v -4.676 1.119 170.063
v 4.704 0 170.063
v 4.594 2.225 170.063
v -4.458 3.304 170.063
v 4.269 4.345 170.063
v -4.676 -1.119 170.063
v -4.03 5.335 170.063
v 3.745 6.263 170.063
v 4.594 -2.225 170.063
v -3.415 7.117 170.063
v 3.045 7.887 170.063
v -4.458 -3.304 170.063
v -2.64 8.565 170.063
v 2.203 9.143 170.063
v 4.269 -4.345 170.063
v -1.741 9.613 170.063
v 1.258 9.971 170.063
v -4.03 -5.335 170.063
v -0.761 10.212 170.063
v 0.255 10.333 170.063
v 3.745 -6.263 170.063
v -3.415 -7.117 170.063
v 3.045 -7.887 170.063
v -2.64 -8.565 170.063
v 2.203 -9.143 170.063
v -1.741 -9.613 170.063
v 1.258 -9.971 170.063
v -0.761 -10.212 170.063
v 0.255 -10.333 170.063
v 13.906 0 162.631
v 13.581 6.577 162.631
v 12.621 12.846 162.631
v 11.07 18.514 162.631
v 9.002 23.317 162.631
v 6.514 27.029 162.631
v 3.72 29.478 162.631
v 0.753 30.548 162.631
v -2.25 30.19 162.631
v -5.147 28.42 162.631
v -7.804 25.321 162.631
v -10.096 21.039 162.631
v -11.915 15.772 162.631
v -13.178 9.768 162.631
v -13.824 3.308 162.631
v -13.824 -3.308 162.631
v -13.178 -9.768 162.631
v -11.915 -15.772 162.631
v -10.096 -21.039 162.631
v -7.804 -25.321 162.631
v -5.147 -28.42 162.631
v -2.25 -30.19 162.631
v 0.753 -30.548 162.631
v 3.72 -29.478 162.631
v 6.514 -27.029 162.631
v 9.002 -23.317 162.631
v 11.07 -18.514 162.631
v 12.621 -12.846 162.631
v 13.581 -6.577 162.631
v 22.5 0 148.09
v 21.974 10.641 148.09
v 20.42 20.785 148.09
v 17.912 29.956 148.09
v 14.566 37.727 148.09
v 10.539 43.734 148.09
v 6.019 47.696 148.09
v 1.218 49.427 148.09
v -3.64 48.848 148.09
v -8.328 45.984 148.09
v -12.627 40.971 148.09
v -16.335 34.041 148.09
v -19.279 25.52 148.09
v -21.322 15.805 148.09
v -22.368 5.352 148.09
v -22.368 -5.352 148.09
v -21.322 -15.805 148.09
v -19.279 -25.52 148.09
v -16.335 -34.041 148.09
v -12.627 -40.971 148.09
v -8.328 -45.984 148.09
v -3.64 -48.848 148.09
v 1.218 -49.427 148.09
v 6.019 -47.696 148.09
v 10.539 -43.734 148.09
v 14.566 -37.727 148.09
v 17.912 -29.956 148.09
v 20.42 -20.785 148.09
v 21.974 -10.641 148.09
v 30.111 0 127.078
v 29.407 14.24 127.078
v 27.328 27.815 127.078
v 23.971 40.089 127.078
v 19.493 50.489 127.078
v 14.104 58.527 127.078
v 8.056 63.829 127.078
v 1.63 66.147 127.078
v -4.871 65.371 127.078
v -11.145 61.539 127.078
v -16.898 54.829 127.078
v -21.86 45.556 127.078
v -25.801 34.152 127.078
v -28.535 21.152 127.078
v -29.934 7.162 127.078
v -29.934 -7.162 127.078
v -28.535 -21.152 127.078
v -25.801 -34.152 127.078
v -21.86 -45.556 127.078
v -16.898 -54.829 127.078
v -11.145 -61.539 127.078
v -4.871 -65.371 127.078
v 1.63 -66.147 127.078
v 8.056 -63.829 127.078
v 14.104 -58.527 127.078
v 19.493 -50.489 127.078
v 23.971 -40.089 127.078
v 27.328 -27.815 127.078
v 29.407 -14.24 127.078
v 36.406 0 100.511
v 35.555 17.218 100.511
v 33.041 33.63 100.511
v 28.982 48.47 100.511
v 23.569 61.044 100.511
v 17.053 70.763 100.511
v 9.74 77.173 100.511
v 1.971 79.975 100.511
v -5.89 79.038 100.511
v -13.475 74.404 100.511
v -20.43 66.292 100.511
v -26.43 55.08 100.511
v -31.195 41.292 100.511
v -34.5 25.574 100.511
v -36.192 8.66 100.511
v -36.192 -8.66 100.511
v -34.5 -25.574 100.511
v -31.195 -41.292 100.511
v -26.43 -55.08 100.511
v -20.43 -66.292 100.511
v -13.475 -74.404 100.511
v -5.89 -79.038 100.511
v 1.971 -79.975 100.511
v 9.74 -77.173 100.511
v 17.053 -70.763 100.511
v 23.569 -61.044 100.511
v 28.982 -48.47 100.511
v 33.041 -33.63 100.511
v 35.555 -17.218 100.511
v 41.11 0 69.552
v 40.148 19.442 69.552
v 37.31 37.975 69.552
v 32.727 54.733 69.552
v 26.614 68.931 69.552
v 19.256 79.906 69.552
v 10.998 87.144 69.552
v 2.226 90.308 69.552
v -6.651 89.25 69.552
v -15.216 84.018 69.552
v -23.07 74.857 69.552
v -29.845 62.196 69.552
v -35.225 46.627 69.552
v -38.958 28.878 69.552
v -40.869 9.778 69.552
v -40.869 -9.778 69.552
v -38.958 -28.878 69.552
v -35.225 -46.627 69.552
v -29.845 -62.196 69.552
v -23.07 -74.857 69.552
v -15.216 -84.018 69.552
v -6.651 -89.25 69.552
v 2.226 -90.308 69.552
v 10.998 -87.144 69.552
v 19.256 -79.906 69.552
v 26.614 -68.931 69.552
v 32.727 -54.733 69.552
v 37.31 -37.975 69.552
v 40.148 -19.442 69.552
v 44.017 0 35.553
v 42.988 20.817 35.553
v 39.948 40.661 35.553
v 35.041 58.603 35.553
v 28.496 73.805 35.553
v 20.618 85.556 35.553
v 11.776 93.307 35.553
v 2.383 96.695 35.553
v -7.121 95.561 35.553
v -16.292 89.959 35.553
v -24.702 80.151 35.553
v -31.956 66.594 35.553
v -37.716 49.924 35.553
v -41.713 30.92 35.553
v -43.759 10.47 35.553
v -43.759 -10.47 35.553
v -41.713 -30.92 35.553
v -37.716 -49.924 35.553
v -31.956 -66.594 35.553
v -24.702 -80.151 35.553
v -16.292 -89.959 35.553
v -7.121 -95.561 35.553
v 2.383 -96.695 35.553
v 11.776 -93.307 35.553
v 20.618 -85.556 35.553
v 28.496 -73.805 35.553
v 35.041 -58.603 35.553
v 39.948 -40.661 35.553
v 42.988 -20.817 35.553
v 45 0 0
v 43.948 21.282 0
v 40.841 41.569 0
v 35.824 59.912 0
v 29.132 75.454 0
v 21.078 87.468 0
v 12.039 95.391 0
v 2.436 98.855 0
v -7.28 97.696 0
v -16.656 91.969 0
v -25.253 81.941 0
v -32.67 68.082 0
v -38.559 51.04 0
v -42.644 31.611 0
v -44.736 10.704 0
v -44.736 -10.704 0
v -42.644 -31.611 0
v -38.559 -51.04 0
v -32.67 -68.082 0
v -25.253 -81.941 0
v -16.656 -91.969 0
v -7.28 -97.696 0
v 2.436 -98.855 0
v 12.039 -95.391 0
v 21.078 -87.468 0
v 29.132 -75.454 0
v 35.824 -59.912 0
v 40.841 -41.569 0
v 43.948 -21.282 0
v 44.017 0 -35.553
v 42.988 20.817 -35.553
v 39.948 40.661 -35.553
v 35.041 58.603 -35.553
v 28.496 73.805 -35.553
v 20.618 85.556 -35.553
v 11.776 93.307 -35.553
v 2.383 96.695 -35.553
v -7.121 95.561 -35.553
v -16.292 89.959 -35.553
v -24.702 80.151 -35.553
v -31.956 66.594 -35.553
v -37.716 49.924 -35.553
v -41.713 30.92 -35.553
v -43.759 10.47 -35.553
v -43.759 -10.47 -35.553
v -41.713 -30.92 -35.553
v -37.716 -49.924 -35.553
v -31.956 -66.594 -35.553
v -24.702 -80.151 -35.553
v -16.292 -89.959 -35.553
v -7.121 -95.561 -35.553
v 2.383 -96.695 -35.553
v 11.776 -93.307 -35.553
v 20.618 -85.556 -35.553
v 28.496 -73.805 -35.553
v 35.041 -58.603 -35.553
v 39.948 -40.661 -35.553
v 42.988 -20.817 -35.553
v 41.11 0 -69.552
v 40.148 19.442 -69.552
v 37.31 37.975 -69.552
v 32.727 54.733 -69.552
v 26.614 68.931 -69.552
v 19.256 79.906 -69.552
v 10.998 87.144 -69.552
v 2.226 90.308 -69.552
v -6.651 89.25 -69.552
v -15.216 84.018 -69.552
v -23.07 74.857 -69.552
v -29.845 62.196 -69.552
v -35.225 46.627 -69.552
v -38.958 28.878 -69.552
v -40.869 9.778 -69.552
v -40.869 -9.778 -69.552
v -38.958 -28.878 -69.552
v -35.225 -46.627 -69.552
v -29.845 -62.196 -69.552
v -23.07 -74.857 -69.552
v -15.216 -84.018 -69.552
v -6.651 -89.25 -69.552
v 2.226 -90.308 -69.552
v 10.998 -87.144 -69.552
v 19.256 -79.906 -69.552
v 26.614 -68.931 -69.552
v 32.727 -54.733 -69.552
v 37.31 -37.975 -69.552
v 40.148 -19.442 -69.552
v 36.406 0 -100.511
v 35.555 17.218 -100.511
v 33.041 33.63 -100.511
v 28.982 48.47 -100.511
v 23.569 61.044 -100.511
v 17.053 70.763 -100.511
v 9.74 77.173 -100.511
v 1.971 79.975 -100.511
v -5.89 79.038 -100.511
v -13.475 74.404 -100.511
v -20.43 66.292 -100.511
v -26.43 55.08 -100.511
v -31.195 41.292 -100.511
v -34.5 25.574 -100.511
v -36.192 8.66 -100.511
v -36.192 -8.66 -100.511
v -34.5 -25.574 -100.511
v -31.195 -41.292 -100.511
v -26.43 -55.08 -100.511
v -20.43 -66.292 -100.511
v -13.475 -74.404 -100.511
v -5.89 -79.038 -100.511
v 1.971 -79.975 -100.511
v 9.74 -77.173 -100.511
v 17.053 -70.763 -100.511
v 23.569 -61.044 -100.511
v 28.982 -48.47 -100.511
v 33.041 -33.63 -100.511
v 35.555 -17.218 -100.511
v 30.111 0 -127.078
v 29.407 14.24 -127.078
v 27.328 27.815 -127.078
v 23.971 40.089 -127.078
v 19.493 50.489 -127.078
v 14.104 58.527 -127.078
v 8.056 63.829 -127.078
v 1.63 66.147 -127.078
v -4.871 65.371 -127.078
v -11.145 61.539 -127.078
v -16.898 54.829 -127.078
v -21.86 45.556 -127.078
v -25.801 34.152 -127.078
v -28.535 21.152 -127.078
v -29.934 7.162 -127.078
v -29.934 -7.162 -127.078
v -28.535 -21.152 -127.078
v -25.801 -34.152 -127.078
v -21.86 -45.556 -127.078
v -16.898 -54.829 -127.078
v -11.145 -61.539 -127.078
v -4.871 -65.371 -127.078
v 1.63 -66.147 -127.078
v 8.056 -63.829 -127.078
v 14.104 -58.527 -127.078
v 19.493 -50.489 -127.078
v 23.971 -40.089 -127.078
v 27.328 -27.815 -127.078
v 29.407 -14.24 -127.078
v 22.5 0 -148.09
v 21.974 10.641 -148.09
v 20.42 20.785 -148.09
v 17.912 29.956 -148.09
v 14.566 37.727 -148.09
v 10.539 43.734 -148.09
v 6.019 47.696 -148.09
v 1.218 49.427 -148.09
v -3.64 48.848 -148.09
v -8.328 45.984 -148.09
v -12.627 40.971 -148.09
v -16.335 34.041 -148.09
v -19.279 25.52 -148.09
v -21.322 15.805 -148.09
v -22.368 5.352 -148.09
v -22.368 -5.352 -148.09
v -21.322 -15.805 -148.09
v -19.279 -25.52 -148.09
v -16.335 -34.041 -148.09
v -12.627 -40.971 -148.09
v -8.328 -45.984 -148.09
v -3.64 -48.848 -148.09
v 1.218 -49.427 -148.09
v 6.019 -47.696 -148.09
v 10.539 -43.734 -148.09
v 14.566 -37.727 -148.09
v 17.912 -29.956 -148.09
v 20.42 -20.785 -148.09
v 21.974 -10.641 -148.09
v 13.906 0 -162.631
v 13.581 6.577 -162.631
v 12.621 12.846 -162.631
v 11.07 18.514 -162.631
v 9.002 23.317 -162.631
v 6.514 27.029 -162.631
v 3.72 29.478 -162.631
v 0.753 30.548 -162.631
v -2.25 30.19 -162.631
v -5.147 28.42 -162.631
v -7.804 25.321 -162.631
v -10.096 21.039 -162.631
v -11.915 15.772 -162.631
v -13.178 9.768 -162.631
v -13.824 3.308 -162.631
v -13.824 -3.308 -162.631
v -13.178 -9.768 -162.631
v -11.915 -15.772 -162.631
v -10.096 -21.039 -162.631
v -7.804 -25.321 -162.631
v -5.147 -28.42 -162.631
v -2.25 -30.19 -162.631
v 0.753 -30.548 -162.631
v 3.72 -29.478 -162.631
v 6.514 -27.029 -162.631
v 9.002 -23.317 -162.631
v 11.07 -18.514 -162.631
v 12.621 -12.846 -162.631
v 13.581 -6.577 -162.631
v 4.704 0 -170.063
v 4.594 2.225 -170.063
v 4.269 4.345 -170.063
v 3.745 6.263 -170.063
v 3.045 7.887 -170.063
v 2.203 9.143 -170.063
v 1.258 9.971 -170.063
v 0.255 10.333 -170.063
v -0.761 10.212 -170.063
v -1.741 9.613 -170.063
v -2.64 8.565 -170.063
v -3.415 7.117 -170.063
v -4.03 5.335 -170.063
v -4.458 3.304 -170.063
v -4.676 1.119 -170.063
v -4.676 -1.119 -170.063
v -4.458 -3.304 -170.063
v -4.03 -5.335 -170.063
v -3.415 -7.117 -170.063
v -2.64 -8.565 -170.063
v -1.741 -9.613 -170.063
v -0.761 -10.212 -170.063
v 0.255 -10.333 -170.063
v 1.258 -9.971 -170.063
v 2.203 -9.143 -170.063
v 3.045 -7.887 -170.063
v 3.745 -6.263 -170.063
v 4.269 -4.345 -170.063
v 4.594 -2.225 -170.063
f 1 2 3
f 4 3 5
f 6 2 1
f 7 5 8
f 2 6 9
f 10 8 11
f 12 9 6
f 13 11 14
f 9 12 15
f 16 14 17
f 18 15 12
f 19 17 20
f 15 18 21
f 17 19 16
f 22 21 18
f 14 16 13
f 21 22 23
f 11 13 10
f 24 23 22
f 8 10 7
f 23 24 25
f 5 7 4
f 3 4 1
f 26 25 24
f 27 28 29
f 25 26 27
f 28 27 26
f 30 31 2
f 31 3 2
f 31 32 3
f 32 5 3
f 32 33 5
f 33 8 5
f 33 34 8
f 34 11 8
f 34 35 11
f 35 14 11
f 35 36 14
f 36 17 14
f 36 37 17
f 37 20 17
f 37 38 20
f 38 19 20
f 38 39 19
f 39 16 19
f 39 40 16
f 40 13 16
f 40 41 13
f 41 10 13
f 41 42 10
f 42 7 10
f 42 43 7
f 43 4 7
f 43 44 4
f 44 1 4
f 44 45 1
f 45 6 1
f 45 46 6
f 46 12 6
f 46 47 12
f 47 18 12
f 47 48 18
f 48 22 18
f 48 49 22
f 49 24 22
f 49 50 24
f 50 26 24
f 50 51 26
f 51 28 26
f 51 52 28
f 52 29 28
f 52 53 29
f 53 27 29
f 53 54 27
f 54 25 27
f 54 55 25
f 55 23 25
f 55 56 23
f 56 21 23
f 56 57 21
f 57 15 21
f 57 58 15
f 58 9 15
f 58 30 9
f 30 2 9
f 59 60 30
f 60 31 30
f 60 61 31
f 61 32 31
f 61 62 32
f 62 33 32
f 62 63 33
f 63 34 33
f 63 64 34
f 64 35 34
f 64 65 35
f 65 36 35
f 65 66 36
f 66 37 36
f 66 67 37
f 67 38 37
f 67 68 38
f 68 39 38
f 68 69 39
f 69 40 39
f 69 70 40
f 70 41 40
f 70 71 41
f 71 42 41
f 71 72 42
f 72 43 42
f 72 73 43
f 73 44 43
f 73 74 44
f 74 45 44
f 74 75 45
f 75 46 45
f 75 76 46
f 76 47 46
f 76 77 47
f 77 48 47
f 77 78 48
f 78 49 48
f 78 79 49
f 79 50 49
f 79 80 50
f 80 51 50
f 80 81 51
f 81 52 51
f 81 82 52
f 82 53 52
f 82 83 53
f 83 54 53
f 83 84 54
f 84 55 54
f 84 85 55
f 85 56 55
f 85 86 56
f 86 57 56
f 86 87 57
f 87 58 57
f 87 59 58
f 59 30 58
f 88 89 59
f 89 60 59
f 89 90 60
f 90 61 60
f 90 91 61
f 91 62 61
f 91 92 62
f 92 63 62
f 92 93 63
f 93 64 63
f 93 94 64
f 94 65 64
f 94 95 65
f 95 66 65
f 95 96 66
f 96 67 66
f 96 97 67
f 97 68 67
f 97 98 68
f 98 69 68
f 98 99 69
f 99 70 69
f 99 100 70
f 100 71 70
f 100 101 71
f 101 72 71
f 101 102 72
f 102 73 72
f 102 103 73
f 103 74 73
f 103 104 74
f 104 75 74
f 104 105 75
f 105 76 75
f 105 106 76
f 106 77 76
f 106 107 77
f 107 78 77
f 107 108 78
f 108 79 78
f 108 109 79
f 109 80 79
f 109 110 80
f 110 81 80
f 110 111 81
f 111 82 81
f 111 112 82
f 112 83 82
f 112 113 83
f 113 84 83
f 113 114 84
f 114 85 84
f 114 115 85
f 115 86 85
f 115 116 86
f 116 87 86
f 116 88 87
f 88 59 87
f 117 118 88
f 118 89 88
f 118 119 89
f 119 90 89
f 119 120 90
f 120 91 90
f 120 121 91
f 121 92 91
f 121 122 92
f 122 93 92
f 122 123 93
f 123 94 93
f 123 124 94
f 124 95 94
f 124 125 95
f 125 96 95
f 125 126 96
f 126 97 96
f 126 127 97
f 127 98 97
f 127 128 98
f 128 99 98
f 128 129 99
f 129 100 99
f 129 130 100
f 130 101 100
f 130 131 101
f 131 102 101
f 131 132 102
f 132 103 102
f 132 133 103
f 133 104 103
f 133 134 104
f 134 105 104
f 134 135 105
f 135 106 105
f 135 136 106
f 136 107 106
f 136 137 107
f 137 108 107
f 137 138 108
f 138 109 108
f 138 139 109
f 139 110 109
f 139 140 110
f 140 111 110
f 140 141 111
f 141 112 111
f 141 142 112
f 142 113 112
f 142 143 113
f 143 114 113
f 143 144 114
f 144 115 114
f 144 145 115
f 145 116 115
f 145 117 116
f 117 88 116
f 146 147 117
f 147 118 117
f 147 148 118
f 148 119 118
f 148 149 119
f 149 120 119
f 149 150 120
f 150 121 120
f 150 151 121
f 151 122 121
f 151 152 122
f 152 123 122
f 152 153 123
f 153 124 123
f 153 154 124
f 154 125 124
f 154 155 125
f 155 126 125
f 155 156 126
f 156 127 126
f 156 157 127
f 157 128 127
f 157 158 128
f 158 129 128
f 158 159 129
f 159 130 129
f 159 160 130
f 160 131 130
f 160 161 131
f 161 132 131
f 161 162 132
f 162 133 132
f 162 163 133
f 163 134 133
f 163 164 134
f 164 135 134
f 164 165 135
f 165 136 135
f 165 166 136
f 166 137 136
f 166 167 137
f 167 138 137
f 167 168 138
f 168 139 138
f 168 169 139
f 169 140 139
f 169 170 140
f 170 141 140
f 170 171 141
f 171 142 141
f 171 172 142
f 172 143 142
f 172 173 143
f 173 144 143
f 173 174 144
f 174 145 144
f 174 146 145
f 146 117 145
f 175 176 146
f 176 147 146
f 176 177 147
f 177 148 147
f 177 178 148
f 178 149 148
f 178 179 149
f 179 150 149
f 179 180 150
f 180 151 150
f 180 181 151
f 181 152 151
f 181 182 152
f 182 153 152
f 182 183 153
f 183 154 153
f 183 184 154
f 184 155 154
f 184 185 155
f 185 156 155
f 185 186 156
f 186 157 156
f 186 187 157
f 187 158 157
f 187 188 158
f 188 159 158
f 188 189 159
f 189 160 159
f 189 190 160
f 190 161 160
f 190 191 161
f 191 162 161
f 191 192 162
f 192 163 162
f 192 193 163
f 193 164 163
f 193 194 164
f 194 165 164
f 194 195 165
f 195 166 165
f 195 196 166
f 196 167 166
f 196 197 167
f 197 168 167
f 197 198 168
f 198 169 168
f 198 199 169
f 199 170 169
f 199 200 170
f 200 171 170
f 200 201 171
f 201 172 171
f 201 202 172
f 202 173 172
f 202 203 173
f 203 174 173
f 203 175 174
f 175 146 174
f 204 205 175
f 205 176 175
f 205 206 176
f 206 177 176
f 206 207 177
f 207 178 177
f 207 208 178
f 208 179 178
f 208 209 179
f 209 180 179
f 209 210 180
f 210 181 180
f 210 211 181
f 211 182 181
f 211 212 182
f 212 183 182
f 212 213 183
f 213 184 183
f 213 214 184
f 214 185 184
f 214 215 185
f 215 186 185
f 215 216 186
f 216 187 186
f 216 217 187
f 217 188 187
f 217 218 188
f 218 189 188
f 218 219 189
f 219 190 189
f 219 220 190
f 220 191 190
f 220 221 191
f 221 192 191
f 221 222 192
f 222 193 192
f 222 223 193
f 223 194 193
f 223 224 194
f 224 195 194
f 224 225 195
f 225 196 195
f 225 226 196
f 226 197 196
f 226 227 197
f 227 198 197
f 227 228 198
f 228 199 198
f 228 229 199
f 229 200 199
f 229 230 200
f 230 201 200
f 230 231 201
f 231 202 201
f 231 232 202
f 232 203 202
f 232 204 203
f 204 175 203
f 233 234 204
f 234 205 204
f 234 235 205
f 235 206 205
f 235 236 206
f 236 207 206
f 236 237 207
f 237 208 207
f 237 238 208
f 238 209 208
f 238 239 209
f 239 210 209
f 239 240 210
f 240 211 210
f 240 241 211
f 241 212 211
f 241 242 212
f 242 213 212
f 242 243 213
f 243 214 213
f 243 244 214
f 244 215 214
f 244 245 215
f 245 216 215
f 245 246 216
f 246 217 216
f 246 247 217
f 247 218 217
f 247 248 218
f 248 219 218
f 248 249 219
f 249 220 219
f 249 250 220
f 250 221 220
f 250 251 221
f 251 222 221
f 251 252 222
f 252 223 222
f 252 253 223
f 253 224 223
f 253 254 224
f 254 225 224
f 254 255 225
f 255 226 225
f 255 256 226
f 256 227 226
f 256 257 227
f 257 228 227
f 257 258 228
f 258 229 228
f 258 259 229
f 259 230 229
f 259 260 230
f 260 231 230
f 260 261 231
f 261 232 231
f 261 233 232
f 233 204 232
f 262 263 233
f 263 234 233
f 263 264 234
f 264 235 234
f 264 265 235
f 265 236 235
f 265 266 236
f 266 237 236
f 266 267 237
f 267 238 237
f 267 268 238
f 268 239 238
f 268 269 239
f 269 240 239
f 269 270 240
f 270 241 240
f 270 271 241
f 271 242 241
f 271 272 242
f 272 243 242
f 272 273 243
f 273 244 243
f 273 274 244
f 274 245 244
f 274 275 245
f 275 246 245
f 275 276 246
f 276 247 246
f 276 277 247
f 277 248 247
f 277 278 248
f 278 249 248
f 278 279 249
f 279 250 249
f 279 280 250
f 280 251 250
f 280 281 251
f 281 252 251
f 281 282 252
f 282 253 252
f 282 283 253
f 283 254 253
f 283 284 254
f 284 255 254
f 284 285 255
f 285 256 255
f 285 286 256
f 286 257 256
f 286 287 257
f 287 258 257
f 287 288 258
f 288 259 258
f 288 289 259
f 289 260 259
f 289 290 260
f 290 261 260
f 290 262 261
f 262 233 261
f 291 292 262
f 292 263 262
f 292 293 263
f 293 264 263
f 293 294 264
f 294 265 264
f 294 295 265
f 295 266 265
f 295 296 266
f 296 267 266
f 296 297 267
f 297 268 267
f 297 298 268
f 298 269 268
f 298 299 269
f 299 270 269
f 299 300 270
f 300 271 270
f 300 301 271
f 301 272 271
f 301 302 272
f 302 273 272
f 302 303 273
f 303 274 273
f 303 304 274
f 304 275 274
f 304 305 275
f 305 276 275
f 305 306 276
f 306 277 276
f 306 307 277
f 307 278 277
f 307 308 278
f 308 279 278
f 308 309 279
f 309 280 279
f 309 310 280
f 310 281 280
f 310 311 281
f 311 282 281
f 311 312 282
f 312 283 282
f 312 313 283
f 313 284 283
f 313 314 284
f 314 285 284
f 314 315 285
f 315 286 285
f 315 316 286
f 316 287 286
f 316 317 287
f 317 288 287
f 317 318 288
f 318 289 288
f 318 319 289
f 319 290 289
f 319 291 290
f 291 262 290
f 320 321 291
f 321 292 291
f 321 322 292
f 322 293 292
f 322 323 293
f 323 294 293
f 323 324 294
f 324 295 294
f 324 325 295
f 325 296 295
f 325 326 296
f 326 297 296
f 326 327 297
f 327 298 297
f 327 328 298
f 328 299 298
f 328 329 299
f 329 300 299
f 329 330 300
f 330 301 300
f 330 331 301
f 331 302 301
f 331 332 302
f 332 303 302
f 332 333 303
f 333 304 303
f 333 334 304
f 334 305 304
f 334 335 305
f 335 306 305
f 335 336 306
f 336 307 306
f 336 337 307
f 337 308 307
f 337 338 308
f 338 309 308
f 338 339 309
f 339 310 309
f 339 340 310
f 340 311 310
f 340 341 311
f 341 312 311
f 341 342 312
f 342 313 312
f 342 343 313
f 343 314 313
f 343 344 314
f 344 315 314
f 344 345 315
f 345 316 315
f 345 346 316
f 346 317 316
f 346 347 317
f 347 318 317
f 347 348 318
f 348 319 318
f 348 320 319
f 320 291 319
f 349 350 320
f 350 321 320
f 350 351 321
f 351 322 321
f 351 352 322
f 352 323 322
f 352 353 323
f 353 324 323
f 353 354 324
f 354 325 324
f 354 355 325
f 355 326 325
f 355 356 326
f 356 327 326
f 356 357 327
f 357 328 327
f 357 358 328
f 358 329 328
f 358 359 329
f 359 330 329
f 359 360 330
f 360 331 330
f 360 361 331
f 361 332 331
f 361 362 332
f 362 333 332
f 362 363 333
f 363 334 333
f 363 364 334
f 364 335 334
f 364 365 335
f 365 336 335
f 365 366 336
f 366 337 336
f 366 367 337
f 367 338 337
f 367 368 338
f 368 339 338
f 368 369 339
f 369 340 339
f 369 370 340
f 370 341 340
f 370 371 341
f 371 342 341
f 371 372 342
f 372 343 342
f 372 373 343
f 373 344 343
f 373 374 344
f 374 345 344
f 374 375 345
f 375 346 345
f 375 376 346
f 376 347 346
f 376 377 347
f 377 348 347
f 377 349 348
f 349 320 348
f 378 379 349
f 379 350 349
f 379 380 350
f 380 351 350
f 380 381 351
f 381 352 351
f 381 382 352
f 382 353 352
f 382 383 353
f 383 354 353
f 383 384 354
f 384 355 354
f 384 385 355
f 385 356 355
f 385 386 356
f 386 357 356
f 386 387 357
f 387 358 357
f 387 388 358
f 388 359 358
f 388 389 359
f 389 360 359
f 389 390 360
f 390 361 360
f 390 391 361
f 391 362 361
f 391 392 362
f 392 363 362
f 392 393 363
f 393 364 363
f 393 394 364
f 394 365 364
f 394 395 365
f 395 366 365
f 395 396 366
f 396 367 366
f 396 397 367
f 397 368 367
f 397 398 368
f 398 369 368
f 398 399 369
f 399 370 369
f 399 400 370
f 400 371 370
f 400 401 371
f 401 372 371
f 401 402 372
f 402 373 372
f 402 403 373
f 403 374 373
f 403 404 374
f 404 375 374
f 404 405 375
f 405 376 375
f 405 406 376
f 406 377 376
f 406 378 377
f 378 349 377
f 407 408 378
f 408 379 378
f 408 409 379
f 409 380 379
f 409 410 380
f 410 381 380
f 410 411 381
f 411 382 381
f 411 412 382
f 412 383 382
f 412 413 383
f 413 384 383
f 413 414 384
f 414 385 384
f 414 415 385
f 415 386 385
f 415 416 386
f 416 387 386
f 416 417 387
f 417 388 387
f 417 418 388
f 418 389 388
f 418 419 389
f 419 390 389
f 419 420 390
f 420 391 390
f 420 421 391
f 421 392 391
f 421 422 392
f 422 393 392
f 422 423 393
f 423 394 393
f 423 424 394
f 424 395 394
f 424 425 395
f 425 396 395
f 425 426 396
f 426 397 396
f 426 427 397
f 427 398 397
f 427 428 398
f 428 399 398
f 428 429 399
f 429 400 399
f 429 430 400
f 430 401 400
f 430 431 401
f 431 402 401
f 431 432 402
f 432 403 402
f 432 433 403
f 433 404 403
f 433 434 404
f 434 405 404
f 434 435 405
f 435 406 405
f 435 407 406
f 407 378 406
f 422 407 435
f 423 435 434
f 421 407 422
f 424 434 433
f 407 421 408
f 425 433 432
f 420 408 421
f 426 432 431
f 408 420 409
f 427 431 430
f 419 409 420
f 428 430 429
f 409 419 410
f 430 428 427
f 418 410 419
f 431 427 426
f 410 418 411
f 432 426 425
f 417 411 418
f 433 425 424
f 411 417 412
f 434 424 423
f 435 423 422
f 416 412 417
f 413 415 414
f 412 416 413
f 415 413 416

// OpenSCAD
// Generated by SolidPython 1.0.1 on 2020-07-29 00:46:46


scale(v = [5, 11, 19]) {
	sphere(r = 9);
}
/***********************************************
*********      SolidPython code:      **********
************************************************
 
# import packages: SolidPython
from solid import *
from solid.utils import *
from itertools import chain, combinations, permutations


class Resize:

    def __init__(self, scad_file):
        self.scad_file = scad_file
        #self.scad_file = import_scad(scad_file)
        # cone/cylinder param:
        self.r1 = 0
        self.r2 = 0
        self.h = 0
        # rectangular prism param:
        self.w = 0
        self.l = 0
        # ellipse param:
        self.r = 0

    # import OpenScad code (file name corresponds to shape)


    # classify shape + parameters
    def assign(self, param1, param2, param3):
        if self.scad_file == 'cone.scad':
            self.r1 = param1
            self.r2 = param2
            self.h = param3
        elif self.scad_file == 'cylinder.scad':
            self.r1 = param1
            self.r2 = param2
            self.h = param3
        elif self.scad_file == 'rectangularPrism.scad':
            self.h = param1
            self.l = param2
            self.w = param3
        else:
            self.r = param1
            self.h = param2

    # resize parameters
    def iterate(self):
        x = range(3, 20, 2)
        i = 1
        if self.scad_file == 'cone.scad':
            tempList = list(permutations(x, 2))
            for temp in tempList:
                param1 = temp[0]
                param2 = temp[1]
                filepath = 'produced_scad_files/' + 'cone' + str(param1) + '_' + str(param2) + '_' + '.scad'
                scad_render_to_file(cylinder(h=param1, r1=param2, r2=0), filepath)

        elif self.scad_file == 'cylinder.scad':
            tempList = list(permutations(x, 3))
            for temp in tempList:
                param1 = temp[0]
                param2 = temp[1]
                filepath = 'produced_scad_files/' + 'cylinder' + str(param1) + '_' + str(param2) + '_' + '.scad'
                scad_render_to_file(cylinder(h=param1, r1=param2, r2=param2), filepath)

        elif self.scad_file == 'rectangularPrism.scad':
            tempList = list(permutations(x, 3))
            for temp in tempList:
                param1 = temp[0]
                param2 = temp[1]
                param3 = temp[2]
                filepath = 'produced_scad_files/' + 'rectangularPrism' + str(param1) + '_' + str(param2) + '_' + str(
                    param3) + '.scad'
                scad_render_to_file(cube(size=(param1, param2, param3)), filepath)

        elif self.scad_file == 'ellipse.scad':
            tempList = list(permutations(x, 4))
            for temp in tempList:
                param1 = temp[0]
                param2 = temp[1]
                param3 = temp[2]
                param4 = temp[3]
                filepath = 'produced_scad_files/' + 'ellipse' + str(param1) + '_' + str(param2) + '_' + str(param3) + '_' + str(param4) + '.scad'
                scad_render_to_file(scale([param1, param2, param3])(sphere(r=param4)), filepath)

    def render_to_scadfile(self):
        scad_render_to_file(scad, 'example.scad') 
 
************************************************/
